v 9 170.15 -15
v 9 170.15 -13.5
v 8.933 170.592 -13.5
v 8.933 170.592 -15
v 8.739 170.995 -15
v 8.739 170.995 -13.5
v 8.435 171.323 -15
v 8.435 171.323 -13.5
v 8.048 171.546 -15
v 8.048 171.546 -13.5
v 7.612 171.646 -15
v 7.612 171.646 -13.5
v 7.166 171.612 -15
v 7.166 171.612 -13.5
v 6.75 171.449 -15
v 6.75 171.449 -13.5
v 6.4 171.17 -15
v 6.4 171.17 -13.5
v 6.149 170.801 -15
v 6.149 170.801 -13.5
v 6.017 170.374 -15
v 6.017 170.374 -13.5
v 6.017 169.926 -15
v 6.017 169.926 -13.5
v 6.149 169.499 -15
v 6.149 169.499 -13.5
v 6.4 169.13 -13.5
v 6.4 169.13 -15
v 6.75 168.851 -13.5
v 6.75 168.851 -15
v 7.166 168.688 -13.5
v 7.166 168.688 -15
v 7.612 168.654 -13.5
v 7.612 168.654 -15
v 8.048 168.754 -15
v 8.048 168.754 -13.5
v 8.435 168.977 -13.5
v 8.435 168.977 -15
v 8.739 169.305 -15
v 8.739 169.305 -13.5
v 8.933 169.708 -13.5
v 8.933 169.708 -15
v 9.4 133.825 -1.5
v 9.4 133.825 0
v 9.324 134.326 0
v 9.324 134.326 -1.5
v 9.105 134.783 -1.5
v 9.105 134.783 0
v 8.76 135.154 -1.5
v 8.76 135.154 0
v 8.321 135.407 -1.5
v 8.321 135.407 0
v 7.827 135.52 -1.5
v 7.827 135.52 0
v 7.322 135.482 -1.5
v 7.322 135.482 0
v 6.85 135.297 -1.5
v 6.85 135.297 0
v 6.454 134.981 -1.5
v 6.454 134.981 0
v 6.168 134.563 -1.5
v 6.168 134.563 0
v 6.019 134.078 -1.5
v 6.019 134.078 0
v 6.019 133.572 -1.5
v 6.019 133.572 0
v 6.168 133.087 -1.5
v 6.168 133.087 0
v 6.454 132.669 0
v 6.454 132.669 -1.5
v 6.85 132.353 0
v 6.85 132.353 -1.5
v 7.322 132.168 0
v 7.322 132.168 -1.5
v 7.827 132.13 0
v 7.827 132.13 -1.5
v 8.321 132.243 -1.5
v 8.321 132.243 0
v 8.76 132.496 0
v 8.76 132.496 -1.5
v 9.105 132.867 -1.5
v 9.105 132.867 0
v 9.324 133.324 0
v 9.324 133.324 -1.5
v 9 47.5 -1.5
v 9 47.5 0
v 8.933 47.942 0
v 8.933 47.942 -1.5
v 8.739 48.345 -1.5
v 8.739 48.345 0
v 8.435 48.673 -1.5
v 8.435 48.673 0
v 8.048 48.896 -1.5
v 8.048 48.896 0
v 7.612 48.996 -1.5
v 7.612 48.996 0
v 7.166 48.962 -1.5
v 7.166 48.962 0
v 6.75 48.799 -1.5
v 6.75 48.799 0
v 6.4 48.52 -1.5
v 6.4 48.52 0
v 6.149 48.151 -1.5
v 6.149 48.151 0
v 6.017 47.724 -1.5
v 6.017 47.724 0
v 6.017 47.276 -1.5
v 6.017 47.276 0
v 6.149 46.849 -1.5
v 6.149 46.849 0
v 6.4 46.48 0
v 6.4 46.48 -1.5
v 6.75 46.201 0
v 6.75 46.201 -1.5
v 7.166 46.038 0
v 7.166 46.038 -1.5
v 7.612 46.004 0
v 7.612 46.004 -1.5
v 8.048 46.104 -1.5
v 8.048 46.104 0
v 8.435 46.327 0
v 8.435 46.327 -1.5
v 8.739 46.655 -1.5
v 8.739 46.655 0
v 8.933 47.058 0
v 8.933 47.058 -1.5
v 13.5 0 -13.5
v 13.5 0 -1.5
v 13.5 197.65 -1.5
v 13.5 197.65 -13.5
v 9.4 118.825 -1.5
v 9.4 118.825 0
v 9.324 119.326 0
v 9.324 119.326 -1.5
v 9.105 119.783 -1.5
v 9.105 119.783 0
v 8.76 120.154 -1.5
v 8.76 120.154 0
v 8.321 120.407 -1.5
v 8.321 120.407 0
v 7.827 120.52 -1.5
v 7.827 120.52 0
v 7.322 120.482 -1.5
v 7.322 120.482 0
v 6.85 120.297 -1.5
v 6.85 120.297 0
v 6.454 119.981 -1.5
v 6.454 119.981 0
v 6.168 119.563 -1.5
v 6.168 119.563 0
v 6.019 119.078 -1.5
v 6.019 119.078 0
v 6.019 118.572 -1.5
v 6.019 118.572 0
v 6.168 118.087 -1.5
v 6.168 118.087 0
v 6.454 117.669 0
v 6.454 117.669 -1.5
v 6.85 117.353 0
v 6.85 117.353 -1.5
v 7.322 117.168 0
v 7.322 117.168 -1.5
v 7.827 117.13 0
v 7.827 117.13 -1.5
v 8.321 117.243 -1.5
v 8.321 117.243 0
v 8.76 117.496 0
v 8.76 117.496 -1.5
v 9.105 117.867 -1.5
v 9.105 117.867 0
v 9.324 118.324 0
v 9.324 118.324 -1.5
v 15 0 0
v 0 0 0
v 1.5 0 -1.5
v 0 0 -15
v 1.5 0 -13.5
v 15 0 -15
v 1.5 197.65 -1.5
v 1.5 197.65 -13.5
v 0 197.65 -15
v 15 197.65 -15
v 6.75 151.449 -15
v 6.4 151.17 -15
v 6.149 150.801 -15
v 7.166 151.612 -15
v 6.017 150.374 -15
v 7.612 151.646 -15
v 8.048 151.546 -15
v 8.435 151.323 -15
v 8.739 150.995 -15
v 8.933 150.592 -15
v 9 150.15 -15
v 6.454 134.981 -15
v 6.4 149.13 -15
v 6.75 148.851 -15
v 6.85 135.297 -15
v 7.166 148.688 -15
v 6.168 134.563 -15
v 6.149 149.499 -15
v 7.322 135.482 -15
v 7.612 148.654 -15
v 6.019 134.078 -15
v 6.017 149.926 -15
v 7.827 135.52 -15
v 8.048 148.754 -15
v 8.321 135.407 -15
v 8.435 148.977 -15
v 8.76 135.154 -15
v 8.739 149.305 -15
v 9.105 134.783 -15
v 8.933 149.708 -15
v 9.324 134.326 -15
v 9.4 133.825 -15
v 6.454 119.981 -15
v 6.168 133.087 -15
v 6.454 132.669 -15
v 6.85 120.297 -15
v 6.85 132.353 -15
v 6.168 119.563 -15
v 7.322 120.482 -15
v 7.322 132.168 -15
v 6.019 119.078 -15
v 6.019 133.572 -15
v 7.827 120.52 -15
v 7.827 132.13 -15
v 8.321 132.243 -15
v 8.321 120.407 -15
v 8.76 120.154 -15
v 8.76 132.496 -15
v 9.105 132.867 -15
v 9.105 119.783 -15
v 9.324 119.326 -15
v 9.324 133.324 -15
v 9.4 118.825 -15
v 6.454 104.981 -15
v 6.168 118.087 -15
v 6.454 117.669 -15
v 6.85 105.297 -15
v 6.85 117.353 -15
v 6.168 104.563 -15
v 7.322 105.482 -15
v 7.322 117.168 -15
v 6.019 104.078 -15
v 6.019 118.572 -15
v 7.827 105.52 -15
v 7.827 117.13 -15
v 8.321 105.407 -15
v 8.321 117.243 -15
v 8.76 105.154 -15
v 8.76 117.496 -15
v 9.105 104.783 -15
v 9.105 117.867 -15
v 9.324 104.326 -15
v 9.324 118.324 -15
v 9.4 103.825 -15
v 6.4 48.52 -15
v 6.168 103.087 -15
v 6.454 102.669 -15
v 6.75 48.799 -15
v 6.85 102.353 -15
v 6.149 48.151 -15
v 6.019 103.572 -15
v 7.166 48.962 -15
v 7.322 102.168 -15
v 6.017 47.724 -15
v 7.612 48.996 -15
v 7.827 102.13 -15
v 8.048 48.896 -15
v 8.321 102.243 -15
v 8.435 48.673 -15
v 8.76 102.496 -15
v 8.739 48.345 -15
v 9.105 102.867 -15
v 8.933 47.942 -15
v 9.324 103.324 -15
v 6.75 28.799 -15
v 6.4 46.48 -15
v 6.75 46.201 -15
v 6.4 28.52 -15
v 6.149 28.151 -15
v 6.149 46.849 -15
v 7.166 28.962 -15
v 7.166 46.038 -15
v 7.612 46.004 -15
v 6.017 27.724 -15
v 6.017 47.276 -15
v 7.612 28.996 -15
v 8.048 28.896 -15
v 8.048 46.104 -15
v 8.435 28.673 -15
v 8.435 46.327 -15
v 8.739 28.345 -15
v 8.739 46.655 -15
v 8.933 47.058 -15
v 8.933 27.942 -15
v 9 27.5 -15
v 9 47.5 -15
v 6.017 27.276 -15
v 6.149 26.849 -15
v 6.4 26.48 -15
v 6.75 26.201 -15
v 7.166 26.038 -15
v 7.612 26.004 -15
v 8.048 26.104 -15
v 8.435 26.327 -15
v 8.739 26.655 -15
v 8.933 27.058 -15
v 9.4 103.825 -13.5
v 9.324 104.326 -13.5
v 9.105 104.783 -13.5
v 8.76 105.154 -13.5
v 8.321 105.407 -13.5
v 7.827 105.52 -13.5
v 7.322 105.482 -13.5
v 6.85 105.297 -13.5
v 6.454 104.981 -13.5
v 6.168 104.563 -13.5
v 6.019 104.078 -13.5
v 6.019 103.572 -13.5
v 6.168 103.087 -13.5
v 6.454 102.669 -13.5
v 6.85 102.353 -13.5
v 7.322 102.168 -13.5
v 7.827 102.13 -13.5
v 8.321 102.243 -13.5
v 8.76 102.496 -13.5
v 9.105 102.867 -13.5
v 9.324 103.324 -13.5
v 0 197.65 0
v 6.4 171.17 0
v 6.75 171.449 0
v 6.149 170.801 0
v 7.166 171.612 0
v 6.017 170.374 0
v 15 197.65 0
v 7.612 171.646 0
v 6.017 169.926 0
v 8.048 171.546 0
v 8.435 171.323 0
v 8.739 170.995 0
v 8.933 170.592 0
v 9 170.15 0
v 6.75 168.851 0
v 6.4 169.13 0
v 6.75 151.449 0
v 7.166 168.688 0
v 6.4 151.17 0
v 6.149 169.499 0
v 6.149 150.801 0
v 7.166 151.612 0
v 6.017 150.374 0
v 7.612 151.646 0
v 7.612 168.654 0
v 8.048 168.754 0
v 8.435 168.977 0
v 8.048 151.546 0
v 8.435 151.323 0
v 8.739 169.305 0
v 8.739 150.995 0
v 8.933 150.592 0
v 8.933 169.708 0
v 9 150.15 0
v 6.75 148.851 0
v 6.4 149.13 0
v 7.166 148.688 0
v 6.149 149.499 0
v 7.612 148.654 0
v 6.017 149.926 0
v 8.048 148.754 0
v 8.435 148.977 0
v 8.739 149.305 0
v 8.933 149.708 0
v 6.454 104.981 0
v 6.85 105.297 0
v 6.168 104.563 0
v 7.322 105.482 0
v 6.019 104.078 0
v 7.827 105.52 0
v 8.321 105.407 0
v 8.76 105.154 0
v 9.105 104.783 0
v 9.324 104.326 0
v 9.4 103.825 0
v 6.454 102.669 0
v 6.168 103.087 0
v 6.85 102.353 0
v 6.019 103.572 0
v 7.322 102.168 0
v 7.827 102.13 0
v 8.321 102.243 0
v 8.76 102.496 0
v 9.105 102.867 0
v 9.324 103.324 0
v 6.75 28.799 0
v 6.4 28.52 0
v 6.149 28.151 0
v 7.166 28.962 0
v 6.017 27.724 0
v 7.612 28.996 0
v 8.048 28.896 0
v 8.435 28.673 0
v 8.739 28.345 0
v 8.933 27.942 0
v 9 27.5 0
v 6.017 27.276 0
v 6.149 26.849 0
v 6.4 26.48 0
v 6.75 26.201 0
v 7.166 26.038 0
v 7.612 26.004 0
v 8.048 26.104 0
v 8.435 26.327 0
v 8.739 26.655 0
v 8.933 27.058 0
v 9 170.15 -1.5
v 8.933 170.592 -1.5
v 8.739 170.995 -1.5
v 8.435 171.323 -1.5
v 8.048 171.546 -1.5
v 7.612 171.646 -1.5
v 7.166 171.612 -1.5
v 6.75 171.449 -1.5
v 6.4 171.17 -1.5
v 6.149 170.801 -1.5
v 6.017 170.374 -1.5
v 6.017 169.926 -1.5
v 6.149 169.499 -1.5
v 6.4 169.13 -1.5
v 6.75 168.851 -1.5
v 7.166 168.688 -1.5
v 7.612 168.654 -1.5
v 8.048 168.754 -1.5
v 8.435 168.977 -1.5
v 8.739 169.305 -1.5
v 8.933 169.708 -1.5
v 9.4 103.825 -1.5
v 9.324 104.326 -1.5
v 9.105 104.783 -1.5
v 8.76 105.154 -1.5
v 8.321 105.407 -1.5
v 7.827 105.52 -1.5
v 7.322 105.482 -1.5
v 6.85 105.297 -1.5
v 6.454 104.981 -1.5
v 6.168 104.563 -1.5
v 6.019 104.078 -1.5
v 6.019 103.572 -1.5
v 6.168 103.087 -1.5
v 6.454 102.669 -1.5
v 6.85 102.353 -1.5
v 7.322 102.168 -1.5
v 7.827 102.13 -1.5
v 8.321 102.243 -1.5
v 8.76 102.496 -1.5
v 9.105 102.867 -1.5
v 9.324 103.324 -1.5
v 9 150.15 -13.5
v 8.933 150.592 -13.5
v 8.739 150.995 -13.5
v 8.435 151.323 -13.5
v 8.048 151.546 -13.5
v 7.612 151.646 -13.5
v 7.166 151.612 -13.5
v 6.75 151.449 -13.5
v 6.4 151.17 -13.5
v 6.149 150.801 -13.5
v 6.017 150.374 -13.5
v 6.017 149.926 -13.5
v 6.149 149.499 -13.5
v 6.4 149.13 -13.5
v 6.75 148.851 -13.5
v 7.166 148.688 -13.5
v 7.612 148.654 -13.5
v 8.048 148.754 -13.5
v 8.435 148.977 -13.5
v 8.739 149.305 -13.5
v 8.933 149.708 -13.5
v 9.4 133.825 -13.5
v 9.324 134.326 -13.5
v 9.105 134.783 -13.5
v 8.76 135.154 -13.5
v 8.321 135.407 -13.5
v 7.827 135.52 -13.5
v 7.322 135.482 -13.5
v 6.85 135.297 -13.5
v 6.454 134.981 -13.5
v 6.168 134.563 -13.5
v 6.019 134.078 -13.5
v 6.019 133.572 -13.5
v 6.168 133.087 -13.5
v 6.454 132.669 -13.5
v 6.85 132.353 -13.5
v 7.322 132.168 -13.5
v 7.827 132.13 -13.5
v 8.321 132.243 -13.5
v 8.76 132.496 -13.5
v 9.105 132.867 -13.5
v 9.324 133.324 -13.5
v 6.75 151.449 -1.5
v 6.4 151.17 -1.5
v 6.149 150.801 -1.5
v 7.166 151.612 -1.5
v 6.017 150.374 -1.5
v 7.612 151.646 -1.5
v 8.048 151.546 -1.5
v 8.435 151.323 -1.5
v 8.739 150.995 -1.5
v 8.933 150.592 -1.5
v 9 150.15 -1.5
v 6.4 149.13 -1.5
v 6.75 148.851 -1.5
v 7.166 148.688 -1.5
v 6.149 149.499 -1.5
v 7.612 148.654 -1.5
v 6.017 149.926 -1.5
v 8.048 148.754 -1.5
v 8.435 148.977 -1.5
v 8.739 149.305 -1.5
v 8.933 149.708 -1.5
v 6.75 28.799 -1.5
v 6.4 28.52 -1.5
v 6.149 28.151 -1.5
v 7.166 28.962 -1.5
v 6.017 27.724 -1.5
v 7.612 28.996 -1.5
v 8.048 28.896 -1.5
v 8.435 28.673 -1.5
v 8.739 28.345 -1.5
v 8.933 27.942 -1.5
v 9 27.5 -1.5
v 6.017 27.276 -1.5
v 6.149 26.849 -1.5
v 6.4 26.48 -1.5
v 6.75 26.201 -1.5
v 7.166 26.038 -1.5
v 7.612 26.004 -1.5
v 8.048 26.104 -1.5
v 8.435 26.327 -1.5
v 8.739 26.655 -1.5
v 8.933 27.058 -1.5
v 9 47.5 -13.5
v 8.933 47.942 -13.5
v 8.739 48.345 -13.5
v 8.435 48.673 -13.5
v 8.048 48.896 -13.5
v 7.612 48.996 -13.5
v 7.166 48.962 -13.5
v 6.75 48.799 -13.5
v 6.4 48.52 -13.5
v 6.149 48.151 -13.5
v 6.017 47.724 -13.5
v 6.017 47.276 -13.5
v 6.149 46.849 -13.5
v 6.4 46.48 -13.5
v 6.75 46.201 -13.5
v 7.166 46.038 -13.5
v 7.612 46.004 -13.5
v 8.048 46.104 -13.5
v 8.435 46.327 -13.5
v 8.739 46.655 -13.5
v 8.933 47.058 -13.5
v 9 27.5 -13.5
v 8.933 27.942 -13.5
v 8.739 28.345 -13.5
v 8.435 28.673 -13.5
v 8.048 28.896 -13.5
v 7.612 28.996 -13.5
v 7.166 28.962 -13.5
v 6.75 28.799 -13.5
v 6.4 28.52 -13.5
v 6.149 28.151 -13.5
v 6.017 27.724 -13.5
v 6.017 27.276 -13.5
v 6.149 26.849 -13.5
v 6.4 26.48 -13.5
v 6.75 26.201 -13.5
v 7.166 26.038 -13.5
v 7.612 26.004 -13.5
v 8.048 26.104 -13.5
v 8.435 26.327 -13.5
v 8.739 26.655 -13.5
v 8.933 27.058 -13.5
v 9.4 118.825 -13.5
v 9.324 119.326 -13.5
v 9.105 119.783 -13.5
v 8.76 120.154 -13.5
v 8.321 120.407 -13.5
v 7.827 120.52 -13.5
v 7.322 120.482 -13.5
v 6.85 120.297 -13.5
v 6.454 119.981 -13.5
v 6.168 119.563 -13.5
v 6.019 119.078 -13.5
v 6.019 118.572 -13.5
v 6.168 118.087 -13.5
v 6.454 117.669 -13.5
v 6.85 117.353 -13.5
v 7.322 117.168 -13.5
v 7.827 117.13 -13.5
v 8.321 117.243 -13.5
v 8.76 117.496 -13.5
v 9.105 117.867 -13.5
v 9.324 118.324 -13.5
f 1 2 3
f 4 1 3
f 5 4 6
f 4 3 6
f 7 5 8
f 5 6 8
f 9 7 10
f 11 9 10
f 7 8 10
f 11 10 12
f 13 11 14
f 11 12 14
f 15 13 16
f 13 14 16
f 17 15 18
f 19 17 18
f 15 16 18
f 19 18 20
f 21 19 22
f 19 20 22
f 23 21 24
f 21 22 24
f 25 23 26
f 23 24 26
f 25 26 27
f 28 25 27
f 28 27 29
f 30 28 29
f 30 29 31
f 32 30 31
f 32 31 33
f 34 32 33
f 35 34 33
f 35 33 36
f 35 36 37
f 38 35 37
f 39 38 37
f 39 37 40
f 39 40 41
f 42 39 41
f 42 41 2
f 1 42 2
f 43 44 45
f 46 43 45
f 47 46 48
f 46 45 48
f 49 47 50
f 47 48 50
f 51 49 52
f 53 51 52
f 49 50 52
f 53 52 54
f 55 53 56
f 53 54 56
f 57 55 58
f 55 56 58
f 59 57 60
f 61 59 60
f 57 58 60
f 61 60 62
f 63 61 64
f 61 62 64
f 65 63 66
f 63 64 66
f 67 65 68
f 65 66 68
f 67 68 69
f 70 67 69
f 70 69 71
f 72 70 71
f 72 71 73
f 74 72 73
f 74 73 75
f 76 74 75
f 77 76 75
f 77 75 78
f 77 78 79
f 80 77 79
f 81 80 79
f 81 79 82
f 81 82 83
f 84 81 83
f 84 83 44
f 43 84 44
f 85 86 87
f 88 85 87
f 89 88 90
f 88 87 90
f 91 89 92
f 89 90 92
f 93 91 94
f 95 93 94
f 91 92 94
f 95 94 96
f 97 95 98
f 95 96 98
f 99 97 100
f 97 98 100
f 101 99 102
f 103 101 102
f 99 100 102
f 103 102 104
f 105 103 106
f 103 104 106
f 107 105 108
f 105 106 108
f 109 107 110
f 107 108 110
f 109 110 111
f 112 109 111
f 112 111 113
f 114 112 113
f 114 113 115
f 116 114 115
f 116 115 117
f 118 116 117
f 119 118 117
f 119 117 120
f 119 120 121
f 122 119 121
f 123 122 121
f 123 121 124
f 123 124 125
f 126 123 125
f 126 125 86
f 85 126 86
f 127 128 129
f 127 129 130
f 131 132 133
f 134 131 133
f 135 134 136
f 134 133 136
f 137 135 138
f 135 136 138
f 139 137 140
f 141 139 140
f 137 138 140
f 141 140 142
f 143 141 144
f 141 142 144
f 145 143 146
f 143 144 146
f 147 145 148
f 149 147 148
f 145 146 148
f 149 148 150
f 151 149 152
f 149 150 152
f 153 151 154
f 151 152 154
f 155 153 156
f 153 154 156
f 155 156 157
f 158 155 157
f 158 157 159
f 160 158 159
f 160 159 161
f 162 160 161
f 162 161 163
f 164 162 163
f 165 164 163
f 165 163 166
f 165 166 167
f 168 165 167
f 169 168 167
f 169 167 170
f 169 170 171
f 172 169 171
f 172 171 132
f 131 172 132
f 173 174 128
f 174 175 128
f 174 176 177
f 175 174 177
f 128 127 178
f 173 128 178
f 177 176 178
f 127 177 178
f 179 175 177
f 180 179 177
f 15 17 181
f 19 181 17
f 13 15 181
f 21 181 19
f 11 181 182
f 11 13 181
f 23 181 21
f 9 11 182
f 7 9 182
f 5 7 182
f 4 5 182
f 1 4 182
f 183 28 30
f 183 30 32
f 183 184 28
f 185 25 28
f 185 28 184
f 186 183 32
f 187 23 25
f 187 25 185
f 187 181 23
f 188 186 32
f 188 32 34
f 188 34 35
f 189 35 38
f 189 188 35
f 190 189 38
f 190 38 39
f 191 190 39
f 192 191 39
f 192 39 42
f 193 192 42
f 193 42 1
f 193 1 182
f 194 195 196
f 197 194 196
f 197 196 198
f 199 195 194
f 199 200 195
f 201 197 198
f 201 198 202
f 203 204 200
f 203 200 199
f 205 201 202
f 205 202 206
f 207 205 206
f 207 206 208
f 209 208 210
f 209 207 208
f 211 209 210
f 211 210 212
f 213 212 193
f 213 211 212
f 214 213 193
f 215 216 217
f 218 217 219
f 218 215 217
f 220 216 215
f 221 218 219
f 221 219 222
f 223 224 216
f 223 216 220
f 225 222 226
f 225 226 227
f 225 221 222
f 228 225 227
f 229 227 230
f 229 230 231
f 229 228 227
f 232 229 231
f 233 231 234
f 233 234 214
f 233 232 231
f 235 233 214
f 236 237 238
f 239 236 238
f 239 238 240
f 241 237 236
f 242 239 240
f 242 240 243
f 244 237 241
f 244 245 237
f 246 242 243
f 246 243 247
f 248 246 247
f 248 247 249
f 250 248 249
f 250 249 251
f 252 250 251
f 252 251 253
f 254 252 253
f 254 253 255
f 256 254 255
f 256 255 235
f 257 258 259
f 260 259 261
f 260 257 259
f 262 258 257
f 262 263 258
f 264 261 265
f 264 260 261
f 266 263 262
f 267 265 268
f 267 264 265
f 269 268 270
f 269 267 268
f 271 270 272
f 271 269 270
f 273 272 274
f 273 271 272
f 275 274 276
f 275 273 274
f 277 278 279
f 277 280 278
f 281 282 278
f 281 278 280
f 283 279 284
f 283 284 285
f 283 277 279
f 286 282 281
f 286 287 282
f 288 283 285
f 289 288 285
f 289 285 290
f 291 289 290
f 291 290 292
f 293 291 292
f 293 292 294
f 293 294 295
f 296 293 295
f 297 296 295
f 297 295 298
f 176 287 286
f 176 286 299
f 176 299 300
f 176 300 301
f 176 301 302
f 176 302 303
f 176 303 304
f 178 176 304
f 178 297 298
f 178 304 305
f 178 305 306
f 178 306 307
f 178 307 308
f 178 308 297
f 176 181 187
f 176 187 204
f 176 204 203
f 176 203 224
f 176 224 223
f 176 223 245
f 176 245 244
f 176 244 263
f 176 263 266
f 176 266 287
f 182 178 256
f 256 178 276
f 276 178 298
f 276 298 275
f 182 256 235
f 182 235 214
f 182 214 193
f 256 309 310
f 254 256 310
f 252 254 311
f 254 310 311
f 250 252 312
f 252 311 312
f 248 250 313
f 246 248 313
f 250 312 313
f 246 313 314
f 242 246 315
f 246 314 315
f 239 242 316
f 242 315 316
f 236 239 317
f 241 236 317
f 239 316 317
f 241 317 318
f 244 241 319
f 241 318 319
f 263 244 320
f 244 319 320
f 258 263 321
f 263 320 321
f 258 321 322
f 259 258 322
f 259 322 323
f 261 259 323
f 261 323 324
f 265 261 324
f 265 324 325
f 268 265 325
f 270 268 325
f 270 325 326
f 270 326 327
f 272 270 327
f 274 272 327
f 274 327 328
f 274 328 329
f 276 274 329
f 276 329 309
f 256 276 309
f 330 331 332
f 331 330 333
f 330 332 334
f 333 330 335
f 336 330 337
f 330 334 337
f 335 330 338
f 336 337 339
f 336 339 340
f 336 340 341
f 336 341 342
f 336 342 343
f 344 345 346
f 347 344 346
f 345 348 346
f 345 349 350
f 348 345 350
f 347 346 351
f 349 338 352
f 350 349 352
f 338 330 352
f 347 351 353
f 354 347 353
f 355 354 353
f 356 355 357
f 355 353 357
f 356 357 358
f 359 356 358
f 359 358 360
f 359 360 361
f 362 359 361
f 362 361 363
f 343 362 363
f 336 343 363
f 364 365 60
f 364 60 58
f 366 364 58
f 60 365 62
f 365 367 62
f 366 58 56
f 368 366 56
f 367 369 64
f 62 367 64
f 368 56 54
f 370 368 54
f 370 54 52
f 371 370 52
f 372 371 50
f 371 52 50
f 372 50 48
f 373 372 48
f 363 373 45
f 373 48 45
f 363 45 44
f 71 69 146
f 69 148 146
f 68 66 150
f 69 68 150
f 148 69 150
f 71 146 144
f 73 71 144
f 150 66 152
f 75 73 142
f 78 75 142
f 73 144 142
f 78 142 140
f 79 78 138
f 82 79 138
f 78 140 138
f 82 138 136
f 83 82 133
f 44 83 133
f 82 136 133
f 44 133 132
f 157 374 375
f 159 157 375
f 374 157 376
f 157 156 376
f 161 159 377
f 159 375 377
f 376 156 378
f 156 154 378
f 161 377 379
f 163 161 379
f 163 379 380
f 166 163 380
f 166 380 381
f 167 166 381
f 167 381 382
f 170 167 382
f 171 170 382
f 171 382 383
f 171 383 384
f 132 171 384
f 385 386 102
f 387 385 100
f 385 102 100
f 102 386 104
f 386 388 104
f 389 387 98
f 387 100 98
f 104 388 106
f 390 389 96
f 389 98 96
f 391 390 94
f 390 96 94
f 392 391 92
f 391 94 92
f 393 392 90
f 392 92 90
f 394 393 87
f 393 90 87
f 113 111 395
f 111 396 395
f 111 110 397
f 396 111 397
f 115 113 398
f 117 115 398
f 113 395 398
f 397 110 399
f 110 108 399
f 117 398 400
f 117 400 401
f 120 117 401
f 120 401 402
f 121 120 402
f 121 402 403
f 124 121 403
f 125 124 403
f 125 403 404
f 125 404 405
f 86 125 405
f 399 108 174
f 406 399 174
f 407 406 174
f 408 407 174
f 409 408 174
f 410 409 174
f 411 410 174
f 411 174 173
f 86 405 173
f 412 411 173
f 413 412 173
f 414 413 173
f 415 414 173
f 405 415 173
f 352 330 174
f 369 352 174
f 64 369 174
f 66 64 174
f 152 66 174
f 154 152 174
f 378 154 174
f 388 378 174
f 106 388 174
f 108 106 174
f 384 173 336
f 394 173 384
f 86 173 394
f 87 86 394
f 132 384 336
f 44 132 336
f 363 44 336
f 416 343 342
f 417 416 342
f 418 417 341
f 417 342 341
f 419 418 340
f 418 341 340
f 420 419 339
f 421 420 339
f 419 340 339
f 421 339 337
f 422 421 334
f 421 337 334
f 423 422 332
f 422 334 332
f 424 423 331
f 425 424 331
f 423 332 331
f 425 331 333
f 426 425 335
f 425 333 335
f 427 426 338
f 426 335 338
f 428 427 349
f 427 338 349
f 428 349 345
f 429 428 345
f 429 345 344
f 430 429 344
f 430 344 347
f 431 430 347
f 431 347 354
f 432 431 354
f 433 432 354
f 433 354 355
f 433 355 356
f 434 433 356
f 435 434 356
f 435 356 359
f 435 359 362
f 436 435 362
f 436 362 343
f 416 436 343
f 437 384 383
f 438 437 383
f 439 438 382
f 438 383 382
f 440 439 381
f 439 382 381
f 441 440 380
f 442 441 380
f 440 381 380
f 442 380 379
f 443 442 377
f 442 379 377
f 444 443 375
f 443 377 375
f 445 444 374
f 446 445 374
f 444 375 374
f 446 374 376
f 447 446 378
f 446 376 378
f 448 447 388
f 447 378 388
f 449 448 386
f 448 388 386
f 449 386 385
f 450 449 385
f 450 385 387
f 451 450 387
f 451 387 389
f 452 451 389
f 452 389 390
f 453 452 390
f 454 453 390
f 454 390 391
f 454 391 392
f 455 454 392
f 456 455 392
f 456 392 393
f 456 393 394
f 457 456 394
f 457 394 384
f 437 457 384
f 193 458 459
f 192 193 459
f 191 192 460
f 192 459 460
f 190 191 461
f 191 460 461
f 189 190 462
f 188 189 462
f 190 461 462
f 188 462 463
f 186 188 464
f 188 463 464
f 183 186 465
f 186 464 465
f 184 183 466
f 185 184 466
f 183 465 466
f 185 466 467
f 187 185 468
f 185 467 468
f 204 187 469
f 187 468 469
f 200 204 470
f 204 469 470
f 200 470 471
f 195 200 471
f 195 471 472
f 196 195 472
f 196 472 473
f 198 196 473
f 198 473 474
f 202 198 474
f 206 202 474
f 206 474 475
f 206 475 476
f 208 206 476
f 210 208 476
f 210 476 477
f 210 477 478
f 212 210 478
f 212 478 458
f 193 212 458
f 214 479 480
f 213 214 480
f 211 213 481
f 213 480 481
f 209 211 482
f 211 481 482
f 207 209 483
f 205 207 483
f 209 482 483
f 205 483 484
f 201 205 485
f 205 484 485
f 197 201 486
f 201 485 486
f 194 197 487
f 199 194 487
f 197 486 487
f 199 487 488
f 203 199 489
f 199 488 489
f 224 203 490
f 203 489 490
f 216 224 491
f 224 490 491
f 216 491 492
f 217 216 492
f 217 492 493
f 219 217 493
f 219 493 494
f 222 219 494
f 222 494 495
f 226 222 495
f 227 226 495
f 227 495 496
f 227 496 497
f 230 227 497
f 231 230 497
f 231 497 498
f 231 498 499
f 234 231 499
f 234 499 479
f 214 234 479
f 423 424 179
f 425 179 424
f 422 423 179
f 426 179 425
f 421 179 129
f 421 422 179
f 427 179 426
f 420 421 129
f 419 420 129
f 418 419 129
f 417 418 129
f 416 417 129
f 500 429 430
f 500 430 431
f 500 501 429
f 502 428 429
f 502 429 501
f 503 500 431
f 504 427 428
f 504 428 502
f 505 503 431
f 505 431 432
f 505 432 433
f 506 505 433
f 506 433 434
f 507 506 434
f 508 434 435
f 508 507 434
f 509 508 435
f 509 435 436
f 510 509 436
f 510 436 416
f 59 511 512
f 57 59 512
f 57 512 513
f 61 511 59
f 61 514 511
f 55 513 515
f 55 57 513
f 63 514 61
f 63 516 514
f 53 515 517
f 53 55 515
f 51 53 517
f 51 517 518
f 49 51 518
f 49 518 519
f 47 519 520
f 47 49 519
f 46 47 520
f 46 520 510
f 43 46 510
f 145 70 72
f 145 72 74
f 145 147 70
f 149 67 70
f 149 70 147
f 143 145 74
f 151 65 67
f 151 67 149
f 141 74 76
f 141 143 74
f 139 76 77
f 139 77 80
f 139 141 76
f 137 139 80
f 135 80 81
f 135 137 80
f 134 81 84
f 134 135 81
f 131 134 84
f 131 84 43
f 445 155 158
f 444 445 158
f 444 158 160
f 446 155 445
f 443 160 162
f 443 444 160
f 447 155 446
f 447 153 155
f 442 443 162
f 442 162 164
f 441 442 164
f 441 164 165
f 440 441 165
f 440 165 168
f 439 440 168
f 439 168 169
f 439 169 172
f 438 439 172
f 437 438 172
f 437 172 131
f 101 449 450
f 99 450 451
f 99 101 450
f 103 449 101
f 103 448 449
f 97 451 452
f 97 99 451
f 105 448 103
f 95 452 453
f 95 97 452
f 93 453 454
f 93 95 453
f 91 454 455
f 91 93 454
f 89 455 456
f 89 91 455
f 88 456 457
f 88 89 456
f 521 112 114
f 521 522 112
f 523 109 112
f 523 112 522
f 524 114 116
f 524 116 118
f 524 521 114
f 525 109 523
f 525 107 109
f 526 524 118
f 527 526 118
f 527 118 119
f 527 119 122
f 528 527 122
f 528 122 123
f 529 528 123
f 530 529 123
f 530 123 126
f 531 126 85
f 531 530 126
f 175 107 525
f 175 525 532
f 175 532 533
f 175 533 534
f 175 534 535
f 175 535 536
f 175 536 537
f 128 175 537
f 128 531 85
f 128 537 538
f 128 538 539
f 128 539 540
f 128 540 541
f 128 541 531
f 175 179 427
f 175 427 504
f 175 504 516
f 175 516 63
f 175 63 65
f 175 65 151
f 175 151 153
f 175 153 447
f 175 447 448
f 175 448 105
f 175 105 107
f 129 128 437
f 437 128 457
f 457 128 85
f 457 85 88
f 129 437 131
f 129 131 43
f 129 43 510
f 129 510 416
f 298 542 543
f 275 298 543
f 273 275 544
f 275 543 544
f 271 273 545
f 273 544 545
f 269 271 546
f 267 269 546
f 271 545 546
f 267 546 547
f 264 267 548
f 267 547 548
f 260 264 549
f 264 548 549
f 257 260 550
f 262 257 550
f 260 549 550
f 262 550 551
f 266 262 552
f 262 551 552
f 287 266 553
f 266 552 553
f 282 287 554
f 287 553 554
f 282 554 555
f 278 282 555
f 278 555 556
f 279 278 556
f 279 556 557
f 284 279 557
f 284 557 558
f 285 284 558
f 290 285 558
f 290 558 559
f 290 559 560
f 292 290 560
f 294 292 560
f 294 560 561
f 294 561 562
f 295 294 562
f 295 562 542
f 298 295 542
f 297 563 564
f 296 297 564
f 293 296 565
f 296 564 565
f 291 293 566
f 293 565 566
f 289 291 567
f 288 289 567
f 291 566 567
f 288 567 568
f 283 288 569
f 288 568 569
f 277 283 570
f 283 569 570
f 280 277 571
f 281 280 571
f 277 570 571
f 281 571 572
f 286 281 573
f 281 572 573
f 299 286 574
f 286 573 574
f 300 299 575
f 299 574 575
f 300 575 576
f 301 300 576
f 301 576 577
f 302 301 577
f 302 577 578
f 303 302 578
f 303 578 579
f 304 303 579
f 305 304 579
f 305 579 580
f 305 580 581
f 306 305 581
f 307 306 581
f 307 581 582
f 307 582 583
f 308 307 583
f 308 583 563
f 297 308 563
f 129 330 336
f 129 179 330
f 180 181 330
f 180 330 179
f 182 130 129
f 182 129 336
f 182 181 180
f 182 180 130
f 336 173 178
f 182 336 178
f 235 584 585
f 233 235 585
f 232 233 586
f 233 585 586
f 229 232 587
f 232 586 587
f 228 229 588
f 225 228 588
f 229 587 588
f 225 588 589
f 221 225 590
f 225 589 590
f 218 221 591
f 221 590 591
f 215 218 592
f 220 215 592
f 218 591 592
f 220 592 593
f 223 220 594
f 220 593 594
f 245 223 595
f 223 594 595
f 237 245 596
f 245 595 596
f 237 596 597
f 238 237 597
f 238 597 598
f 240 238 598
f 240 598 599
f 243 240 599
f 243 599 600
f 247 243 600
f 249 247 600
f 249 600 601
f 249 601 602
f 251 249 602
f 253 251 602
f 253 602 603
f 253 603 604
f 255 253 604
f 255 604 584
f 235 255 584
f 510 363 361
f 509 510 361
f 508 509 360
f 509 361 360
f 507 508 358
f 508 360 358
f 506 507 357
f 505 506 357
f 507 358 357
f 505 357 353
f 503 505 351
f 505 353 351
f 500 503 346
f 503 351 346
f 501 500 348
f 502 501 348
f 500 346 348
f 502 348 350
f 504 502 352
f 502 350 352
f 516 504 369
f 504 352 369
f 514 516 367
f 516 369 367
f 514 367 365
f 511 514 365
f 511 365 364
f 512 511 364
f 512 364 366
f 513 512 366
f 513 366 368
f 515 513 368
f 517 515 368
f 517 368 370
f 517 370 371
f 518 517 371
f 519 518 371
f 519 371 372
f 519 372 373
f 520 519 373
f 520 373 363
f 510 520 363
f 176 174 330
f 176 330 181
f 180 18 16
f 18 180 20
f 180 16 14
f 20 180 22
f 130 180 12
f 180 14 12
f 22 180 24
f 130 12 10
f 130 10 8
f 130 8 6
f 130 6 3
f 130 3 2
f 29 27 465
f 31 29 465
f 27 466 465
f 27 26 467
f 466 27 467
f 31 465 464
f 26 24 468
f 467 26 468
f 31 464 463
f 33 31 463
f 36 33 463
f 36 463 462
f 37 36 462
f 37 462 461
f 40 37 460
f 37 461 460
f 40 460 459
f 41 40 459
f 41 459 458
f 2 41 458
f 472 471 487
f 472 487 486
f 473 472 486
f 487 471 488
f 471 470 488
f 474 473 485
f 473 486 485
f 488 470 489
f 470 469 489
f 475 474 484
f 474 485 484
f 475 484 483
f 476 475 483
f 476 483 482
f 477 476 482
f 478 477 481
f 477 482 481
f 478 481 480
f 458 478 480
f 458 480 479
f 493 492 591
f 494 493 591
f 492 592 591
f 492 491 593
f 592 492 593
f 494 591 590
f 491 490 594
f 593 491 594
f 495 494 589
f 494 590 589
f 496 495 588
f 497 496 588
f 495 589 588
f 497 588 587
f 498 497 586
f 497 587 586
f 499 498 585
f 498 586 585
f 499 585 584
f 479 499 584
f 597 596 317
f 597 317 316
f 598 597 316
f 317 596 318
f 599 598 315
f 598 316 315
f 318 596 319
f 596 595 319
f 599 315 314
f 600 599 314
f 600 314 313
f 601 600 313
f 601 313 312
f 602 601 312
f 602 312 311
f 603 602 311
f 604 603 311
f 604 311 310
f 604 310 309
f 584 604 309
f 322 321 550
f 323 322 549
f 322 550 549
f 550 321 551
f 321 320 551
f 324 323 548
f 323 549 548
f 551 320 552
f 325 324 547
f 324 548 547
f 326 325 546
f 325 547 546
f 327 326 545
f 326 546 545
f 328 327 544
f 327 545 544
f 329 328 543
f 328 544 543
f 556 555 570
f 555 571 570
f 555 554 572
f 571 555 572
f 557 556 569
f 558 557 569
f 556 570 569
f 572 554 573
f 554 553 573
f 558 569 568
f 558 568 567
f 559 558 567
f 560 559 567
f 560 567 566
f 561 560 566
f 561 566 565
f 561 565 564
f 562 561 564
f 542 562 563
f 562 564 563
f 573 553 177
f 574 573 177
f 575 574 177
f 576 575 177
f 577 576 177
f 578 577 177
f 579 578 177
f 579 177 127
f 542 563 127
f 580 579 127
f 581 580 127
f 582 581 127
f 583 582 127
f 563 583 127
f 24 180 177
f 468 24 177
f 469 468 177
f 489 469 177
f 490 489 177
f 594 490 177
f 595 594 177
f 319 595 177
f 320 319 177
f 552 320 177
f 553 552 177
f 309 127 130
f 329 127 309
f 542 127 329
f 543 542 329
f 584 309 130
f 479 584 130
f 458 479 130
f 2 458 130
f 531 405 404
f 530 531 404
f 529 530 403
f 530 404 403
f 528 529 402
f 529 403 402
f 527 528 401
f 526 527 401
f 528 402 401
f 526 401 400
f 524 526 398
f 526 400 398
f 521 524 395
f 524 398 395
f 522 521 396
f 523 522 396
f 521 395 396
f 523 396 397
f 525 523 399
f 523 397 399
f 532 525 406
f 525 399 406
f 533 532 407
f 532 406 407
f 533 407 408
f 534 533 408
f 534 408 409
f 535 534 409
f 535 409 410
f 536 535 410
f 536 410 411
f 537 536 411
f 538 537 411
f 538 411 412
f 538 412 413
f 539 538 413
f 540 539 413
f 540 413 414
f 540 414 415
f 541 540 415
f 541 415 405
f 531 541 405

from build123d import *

# Parameters (mm, degrees)
SKETCH_1_W          = 15
SKETCH_1_H          = 15
SKETCH_1_W_2        = 12
SKETCH_1_H_2        = 12
EXTRUDE_1_DEPTH     = 197.65
SKETCH_2_R          = 1.5
SKETCH_2_R_2        = 1.7
CUT_EXTRUDE_1_DEPTH = 199.785116395


with BuildPart() as part:
    # 草图1 → 凸台-拉伸1 (new body)
    with BuildSketch(Plane(origin=(0, 0, 0), x_dir=(1, 0, 0), z_dir=(0, 1, 0))):
        with Locations((7.5, 7.5)):
            Rectangle(SKETCH_1_W, SKETCH_1_H)
        with Locations((7.5, 7.5)):
            Rectangle(SKETCH_1_W_2, SKETCH_1_H_2, mode=Mode.SUBTRACT)
    extrude(amount=EXTRUDE_1_DEPTH)

    # 草图2 (on Front Plane) → 切除-拉伸1 (cut, through all)
    with BuildSketch(Plane.XY):
        with Locations((7.5, 47.5)):
            Circle(SKETCH_2_R)
        with Locations((7.5, 27.5)):
            Circle(SKETCH_2_R)
        with Locations((7.7, 103.825)):
            Circle(SKETCH_2_R_2)
        with Locations((7.7, 118.825)):
            Circle(SKETCH_2_R_2)
        with Locations((7.7, 133.825)):
            Circle(SKETCH_2_R_2)
        with Locations((7.5, 150.15)):
            Circle(SKETCH_2_R)
        with Locations((7.5, 170.15)):
            Circle(SKETCH_2_R)
    extrude(amount=-CUT_EXTRUDE_1_DEPTH, mode=Mode.SUBTRACT)


solid = part.part
